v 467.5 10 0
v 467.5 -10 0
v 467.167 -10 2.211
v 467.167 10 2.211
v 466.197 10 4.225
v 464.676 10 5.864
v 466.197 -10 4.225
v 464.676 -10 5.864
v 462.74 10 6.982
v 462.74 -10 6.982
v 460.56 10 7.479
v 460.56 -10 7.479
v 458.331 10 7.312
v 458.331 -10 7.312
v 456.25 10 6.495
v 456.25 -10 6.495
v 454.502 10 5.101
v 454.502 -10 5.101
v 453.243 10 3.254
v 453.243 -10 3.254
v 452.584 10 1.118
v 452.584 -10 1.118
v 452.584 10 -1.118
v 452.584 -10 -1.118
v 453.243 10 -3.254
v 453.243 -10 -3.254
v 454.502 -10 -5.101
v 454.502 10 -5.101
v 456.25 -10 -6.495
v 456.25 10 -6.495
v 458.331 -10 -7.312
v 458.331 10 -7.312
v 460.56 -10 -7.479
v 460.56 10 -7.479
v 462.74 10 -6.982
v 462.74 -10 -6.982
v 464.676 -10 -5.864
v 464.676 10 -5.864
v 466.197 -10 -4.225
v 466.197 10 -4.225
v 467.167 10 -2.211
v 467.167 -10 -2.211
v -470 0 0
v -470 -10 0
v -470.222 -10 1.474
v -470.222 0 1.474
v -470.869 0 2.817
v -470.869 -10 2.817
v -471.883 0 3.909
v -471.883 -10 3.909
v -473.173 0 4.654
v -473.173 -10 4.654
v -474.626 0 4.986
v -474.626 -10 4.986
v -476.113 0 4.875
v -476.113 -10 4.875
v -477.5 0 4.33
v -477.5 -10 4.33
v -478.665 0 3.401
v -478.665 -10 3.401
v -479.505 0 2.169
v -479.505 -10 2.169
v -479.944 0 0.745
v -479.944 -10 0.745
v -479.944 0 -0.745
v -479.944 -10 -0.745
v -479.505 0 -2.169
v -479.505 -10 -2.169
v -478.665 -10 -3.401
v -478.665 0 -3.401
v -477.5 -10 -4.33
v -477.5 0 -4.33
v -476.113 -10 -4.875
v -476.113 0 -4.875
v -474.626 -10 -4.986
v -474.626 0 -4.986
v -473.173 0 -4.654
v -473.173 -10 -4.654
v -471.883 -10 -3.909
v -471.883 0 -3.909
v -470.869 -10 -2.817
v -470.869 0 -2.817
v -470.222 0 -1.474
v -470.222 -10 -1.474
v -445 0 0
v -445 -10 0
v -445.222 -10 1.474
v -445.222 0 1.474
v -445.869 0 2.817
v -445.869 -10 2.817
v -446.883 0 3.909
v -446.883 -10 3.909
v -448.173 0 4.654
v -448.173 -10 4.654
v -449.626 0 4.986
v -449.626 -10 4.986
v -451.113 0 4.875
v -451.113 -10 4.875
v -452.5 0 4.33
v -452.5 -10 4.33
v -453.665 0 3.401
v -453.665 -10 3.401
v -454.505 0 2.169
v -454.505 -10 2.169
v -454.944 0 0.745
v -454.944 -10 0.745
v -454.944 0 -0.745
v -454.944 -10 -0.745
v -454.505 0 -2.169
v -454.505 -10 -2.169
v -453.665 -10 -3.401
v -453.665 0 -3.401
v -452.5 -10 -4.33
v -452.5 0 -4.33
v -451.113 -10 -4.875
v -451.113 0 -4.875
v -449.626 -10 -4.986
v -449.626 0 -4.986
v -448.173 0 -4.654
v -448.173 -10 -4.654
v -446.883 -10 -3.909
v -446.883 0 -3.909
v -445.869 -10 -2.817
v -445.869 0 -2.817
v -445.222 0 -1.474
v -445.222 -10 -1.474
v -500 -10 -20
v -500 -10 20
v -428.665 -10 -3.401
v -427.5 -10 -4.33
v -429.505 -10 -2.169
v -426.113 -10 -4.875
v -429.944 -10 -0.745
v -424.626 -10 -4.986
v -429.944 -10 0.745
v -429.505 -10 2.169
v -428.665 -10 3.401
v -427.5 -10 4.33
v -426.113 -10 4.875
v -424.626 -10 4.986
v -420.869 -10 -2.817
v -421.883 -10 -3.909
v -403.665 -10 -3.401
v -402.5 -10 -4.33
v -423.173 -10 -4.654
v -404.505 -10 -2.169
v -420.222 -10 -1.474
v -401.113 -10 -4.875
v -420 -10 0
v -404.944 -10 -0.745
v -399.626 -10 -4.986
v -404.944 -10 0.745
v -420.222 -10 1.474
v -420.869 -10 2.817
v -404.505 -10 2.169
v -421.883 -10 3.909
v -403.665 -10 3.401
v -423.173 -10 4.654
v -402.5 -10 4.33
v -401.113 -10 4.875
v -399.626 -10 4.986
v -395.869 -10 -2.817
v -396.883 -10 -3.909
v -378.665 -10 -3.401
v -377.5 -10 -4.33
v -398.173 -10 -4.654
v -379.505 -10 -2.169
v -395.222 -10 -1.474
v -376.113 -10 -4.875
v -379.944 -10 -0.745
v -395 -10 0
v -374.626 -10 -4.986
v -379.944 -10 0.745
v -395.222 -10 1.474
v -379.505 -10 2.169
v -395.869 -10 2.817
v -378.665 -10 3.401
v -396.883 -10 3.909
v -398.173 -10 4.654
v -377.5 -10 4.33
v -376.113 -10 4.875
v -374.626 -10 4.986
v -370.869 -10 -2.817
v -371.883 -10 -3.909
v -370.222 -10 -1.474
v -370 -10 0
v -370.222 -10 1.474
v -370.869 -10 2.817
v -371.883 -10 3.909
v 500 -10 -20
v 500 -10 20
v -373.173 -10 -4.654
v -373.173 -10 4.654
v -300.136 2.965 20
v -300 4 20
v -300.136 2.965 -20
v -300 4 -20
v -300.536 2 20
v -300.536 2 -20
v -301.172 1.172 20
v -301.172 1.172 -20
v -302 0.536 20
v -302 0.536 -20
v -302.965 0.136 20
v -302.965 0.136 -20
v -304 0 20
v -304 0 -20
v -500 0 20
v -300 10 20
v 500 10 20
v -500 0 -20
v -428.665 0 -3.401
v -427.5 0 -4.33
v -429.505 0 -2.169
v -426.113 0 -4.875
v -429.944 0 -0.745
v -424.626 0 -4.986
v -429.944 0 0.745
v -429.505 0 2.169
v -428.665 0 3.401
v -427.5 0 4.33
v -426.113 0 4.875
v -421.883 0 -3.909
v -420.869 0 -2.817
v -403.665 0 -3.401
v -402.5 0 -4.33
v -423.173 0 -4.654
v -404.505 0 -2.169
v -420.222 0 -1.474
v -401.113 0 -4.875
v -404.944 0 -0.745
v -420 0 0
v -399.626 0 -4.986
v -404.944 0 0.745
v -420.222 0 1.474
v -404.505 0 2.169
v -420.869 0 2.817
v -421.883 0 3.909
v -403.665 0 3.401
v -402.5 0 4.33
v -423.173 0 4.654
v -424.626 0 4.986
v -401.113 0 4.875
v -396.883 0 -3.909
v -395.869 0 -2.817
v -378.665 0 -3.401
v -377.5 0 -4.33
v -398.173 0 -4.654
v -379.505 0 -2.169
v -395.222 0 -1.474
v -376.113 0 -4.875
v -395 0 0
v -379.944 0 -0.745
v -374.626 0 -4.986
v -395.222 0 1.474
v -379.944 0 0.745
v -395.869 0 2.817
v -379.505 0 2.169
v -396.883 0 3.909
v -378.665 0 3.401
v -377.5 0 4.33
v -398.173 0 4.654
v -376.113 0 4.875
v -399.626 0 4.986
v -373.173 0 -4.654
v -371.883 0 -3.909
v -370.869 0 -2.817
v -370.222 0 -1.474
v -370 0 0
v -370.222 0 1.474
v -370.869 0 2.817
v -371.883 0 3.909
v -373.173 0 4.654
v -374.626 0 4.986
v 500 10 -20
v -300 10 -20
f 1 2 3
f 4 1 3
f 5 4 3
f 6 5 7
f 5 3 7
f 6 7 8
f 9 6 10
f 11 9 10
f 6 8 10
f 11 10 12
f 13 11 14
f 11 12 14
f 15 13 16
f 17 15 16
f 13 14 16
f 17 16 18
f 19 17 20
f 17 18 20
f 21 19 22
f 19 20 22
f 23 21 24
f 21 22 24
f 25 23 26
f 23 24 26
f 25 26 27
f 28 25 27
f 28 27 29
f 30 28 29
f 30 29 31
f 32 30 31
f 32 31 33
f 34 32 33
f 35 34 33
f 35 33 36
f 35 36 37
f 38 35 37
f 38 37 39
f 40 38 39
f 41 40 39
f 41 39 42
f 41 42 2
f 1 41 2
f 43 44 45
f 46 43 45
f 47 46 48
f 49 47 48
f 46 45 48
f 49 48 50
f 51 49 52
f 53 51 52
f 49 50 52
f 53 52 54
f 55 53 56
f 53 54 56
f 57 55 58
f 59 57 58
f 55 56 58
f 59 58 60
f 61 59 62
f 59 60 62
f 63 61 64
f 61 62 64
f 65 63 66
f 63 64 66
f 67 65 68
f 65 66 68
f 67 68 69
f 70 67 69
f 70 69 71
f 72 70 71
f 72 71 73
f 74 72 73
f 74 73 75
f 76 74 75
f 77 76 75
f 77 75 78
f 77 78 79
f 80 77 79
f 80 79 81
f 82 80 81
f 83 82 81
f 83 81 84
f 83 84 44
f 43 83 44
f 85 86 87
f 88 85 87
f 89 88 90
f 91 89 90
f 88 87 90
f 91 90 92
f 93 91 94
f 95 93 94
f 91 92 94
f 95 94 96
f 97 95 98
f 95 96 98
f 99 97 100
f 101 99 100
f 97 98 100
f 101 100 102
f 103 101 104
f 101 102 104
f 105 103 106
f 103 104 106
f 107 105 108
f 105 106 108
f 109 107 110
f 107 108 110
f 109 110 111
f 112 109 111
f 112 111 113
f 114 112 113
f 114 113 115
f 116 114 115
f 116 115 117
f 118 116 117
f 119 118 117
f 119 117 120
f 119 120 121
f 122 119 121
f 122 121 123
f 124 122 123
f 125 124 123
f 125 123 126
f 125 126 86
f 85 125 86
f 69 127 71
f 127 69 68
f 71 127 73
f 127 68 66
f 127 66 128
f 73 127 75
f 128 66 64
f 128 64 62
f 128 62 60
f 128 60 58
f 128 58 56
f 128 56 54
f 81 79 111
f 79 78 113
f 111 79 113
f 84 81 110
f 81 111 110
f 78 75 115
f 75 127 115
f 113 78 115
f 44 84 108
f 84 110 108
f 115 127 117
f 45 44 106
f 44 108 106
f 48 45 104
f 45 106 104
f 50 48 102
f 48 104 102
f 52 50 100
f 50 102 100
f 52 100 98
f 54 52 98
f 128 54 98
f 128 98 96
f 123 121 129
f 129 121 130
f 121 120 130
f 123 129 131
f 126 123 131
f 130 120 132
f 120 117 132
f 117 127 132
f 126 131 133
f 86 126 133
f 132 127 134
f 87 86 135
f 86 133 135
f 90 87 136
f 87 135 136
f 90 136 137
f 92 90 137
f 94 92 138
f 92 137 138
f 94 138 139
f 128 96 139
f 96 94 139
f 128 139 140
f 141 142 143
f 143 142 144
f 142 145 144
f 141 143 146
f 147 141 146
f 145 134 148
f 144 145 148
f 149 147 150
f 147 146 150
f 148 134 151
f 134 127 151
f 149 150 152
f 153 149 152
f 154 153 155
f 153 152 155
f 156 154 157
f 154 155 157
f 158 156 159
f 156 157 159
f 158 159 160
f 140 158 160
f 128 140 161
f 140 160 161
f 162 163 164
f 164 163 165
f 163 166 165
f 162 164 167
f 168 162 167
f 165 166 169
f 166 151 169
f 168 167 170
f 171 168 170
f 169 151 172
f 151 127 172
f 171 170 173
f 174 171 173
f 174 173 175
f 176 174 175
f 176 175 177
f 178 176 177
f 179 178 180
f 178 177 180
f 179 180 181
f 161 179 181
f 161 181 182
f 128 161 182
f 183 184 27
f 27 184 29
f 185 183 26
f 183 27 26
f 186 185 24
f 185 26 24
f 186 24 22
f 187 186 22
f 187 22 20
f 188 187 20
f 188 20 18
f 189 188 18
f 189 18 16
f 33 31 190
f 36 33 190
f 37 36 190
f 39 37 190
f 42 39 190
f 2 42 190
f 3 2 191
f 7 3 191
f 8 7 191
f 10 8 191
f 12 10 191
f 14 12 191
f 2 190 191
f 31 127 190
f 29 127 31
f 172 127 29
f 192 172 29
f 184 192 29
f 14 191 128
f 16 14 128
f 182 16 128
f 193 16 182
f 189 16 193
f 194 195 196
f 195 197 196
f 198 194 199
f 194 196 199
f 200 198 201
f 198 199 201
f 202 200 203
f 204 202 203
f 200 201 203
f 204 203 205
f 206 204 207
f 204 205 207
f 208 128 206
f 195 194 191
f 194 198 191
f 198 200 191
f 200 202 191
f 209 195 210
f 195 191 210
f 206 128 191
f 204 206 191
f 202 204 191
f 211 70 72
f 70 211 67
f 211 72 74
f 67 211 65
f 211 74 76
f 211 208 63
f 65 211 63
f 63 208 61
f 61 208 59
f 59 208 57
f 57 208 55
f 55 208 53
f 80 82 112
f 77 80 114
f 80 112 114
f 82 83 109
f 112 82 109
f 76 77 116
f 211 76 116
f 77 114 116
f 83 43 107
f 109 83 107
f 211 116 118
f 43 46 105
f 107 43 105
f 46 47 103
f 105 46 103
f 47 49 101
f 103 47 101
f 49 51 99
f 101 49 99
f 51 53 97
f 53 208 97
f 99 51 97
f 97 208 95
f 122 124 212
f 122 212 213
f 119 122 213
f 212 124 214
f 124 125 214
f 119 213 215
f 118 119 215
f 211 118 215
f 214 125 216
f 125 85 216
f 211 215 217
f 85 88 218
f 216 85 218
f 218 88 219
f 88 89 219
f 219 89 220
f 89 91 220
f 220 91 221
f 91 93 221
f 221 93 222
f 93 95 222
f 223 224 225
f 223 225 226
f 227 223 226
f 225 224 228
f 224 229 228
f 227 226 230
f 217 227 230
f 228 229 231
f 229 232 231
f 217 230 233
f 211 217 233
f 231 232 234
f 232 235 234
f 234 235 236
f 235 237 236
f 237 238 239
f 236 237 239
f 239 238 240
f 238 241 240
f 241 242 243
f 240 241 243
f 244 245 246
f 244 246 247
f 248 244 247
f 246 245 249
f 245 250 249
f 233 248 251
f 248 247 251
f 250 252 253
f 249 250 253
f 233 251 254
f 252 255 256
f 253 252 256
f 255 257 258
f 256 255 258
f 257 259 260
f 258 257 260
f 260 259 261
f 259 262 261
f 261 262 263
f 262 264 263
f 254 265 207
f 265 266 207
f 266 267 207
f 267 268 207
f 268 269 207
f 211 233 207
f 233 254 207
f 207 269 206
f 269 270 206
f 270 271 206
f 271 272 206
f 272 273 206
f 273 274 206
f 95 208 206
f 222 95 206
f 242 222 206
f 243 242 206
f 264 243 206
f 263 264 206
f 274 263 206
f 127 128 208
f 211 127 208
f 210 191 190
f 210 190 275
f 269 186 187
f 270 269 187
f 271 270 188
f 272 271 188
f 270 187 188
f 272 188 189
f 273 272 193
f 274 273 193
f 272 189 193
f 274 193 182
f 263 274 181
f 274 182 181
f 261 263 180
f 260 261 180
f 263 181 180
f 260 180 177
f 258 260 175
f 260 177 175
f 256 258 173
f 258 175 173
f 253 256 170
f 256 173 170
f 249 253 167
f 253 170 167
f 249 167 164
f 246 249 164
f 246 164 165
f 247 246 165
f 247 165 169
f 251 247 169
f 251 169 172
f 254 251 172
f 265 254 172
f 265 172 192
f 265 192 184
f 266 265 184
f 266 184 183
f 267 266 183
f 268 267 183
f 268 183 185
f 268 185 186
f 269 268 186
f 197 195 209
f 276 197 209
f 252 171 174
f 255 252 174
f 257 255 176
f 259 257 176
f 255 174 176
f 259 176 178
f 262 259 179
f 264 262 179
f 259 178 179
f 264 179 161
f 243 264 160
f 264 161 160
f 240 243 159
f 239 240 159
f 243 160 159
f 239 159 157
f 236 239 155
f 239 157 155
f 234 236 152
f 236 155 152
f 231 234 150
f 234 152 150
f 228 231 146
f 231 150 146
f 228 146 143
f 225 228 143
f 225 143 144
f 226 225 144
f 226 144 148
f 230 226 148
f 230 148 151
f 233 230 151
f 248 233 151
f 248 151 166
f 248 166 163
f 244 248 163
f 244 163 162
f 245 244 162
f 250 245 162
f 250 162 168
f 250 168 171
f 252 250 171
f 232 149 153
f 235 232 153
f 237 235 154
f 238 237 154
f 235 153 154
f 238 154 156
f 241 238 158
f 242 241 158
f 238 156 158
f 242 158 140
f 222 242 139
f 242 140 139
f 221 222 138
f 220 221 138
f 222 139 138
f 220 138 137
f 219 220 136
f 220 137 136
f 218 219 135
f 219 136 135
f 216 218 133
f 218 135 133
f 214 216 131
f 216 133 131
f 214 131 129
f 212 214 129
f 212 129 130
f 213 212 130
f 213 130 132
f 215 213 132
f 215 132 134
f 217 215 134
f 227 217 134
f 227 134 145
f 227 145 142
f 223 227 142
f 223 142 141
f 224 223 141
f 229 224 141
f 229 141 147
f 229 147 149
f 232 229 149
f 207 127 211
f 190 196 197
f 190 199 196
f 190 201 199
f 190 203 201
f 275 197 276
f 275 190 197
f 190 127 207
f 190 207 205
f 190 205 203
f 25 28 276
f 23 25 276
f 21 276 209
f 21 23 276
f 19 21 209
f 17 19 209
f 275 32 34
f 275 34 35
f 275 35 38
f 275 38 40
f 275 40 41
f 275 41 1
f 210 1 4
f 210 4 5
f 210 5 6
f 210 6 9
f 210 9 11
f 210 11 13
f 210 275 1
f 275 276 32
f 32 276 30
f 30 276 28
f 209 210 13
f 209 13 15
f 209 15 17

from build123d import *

# Parameters (mm, degrees)
F0_W     = 20
F0_H     = 40
F1_DEPTH = 500
F2_R     = 7.5
F2_R_2   = 5
F3_DEPTH = 25
F4_DEPTH = 25
F5_W     = 200
F5_H     = 10
F6_DEPTH = 40.001
F7_R     = 4


with BuildPart() as f1:
    # F0 (on Right) → F1 (new body, symmetric)
    with BuildSketch(Plane.YZ):
        Rectangle(F0_W, F0_H)
    extrude(amount=F1_DEPTH, both=True)

    # F2 (on face) → F3 (cut)
    with BuildSketch(Plane.XZ.offset(10)):
        with Locations((460, 0)):
            Circle(F2_R)
        with Locations((-475, 0)):
            Circle(F2_R_2)
        with Locations((-450, 0)):
            Circle(F2_R_2)
        with Locations((-425, 0)):
            Circle(F2_R_2)
        with Locations((-400, 0)):
            Circle(F2_R_2)
        with Locations((-375, 0)):
            Circle(F2_R_2)
    extrude(amount=-F3_DEPTH, mode=Mode.SUBTRACT)

    # F2 (on face) → F4 (cut)
    with BuildSketch(Plane.XZ.offset(10)):
        with Locations((460, 0)):
            Circle(F2_R)
        with Locations((-475, 0)):
            Circle(F2_R_2)
        with Locations((-450, 0)):
            Circle(F2_R_2)
        with Locations((-425, 0)):
            Circle(F2_R_2)
        with Locations((-400, 0)):
            Circle(F2_R_2)
        with Locations((-375, 0)):
            Circle(F2_R_2)
    extrude(amount=-F4_DEPTH, mode=Mode.SUBTRACT)

    # F5 (on face) → F6 (cut, through all)
    with BuildSketch(Plane.XY.offset(20)):
        with Locations((-400, 5)):
            Rectangle(F5_W, F5_H)
    extrude(amount=-F6_DEPTH, mode=Mode.SUBTRACT)

    # F7
    f7_edges = [f1.edges().sort_by_distance(p)[0] for p in [
        (-300, 0, 0),
    ]]
    fillet(f7_edges, radius=F7_R)


solid = f1.part
